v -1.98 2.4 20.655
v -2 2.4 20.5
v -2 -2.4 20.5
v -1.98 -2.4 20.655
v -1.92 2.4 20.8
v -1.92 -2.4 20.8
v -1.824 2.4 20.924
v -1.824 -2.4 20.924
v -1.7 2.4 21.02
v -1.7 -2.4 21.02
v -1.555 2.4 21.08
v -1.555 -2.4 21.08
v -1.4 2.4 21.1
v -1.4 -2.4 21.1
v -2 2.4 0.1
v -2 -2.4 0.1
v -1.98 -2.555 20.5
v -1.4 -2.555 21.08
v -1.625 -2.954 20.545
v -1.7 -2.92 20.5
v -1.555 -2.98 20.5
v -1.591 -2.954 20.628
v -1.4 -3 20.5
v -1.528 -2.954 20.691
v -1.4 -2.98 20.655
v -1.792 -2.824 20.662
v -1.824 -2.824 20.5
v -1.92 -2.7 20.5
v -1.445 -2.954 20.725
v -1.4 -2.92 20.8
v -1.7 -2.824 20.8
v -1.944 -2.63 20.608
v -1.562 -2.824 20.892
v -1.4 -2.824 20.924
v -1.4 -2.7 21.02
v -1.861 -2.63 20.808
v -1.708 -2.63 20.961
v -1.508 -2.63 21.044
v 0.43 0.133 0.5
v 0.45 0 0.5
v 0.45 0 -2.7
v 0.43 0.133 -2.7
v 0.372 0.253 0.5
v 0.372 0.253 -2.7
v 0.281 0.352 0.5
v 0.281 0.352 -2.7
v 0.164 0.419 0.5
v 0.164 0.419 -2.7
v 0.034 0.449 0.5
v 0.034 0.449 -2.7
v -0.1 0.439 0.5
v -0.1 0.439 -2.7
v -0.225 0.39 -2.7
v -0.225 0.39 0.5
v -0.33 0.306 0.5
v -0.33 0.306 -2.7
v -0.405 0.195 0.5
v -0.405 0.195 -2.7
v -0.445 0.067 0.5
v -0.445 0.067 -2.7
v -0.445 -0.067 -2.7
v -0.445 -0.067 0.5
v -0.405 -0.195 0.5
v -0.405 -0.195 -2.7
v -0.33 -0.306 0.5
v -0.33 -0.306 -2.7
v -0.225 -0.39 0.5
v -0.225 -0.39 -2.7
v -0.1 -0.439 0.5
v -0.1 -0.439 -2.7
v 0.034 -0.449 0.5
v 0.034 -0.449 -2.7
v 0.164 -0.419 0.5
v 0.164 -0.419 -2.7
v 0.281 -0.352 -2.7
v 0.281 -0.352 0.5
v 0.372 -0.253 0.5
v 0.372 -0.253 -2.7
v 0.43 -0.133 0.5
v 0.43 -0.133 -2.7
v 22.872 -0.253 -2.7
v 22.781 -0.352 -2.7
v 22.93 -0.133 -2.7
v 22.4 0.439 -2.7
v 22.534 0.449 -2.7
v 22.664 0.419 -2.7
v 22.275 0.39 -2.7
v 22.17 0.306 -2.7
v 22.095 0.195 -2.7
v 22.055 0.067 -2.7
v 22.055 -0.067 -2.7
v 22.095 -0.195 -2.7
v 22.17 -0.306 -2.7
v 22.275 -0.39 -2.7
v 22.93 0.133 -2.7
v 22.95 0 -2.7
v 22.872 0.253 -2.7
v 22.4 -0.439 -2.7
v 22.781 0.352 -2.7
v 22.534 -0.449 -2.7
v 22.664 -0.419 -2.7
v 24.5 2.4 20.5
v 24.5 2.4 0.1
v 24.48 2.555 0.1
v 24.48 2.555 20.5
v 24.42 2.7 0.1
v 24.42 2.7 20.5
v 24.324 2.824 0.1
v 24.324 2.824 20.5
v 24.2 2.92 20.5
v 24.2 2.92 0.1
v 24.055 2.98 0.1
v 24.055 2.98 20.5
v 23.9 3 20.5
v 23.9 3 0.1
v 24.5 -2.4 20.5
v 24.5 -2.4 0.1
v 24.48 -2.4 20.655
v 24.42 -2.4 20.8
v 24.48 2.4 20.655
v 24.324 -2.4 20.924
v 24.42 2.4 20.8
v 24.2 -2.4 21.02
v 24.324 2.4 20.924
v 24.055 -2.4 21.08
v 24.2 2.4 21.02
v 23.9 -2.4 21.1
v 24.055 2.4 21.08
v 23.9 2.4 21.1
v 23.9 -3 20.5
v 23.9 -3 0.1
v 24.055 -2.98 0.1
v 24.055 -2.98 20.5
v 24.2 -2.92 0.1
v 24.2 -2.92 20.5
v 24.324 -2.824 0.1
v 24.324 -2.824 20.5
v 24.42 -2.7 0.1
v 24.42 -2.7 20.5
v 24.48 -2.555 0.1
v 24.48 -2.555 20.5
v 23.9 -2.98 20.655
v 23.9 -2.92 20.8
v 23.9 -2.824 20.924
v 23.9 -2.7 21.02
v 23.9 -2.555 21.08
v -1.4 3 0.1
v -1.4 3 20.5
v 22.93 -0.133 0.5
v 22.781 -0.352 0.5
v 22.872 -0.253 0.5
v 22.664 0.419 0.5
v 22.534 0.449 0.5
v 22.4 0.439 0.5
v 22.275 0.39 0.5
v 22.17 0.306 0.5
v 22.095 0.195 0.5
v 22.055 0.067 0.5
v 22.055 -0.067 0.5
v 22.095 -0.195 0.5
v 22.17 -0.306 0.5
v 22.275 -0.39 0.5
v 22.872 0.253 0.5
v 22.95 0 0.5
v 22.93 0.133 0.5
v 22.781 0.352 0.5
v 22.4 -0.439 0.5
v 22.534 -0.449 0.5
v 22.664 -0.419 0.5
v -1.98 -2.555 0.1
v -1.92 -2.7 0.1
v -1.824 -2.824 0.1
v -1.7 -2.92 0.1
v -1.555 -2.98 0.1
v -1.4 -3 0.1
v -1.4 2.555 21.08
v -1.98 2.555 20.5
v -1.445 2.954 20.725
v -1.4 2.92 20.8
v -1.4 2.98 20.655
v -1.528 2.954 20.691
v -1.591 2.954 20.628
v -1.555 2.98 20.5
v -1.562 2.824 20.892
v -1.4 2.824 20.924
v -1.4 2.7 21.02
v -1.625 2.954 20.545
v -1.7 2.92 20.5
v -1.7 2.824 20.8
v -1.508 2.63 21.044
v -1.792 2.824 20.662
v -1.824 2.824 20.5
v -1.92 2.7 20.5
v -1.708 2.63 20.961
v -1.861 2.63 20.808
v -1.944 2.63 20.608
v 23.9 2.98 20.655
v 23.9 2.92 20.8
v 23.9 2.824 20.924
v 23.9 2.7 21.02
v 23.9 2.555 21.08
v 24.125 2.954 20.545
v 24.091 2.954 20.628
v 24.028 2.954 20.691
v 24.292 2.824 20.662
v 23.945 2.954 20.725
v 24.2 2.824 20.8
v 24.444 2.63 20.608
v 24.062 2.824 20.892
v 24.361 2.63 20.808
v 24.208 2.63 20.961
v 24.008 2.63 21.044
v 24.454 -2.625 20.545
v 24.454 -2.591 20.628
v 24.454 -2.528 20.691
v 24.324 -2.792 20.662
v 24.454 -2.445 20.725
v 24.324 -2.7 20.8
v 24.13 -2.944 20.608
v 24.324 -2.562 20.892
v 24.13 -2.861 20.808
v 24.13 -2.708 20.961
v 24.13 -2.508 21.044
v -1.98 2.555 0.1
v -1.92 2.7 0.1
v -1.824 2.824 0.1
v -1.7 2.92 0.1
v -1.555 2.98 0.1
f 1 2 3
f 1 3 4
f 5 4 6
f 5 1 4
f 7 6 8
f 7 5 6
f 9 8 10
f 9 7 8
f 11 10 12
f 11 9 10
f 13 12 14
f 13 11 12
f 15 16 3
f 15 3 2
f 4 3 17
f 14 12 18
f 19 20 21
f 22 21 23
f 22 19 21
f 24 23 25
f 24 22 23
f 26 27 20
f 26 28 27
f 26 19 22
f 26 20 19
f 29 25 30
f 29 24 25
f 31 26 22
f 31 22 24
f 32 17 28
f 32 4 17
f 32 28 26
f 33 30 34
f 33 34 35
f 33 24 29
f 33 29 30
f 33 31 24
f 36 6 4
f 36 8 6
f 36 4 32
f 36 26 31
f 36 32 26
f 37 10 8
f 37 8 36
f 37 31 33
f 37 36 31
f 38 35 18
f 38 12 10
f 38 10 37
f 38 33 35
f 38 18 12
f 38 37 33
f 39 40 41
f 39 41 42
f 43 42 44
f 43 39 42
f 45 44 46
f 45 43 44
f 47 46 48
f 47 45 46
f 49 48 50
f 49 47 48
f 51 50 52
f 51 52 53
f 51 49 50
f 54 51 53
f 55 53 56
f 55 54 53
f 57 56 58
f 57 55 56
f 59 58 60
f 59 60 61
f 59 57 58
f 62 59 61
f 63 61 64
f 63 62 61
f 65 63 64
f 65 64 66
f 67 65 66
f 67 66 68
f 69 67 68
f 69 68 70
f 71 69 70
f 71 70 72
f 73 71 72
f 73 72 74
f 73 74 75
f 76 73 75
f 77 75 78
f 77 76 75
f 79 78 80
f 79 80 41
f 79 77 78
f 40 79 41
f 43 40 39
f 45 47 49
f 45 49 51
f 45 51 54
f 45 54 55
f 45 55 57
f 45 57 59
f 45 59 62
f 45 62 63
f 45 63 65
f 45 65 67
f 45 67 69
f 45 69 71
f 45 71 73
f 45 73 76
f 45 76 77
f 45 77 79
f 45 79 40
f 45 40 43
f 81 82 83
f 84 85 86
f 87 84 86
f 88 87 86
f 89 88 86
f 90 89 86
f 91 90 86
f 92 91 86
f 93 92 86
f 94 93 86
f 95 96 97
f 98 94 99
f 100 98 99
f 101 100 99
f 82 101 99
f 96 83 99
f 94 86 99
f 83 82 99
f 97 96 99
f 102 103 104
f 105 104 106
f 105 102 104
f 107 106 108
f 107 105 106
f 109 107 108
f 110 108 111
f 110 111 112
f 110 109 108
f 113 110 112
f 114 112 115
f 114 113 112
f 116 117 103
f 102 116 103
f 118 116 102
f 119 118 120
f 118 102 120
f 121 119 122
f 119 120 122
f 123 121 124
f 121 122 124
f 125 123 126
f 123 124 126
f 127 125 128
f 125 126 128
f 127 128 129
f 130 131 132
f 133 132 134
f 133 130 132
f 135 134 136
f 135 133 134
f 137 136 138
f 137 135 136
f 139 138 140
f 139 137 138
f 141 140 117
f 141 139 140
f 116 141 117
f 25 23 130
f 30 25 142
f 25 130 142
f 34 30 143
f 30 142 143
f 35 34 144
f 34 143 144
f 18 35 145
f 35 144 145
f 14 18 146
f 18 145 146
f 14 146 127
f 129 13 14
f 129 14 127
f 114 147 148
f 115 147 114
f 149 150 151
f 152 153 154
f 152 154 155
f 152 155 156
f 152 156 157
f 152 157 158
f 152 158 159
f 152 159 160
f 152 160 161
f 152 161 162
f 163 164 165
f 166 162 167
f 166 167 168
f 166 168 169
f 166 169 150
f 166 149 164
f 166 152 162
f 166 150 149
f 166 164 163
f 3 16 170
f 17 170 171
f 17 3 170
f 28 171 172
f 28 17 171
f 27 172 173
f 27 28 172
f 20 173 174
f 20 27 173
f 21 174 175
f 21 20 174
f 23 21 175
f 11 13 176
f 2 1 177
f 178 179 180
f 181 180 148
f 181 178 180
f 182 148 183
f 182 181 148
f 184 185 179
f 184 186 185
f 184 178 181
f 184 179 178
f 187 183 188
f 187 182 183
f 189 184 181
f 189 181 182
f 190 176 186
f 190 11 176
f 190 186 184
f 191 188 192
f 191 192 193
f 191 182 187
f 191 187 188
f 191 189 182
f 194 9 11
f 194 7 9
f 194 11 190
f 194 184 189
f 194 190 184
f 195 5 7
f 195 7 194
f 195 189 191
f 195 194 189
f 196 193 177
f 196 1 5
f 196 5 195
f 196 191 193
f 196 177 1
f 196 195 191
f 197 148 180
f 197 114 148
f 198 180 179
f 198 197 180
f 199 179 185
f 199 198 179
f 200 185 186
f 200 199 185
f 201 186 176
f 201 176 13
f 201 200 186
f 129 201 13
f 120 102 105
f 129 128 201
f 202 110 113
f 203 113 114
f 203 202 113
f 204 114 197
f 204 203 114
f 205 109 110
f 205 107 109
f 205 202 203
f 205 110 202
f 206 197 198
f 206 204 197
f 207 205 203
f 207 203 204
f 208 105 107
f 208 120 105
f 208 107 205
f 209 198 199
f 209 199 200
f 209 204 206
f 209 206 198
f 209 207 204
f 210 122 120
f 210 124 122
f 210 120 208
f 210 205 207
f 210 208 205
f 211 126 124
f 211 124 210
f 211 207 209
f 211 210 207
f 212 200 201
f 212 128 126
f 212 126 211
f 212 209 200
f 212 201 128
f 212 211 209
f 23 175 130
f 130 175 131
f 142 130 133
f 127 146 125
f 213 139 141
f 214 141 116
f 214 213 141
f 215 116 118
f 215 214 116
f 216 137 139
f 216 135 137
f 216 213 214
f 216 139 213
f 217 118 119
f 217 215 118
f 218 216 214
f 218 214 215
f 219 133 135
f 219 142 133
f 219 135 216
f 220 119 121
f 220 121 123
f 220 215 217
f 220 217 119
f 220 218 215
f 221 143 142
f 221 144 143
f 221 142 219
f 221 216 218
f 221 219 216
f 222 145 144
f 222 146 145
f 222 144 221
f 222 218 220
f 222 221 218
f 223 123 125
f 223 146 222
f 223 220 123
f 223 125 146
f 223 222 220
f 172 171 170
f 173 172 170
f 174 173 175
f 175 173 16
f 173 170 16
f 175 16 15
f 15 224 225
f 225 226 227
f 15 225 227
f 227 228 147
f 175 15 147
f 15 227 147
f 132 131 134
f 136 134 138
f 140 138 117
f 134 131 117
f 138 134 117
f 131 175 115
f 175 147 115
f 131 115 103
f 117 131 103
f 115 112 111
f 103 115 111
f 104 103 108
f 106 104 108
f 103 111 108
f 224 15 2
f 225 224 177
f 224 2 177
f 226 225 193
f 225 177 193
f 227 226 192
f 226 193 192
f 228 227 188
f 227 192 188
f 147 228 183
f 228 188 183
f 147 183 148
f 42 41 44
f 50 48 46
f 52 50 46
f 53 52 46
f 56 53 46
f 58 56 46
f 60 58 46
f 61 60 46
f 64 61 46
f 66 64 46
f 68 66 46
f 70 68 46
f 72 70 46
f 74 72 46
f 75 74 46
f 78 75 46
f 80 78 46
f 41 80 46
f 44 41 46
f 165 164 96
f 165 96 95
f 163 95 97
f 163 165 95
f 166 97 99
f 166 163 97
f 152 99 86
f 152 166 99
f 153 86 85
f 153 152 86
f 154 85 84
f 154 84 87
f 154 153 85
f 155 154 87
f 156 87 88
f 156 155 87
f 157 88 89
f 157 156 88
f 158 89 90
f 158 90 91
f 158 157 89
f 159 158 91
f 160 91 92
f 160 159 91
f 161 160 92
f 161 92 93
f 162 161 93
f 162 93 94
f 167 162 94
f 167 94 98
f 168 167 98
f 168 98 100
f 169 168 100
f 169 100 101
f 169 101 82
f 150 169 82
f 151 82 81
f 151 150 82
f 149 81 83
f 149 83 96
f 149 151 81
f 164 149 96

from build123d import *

# Parameters (mm, degrees)
SKETCH_W     = 26.5
SKETCH_H     = 6
PAD_DEPTH    = 21
FILLET_R     = 0.6
SKETCH001_R  = 0.45
PAD001_DEPTH = 3.2


with BuildPart() as fillet_body:
    # Sketch → Pad (new body)
    with BuildSketch(Plane.XY.offset(0.1)):
        with Locations((11.25, 0)):
            Rectangle(SKETCH_W, SKETCH_H)
    extrude(amount=PAD_DEPTH)

    # Fillet
    fillet_edges = [fillet_body.edges().sort_by_distance(p)[0] for p in [
        (-2, 0, 21.1),
        (-2, -3, 10.6),
        (11.25, -3, 21.1),
        (24.5, -3, 10.6),
        (24.5, 0, 21.1),
        (24.5, 3, 10.6),
        (11.25, 3, 21.1),
        (-2, 3, 10.6),
    ]]
    fillet(fillet_edges, radius=FILLET_R)


with BuildPart() as pad001:
    # Sketch001 → Pad001 (new body)
    with BuildSketch(Plane.XY.offset(0.5)):
        Circle(SKETCH001_R)
        with Locations((22.5, 0)):
            Circle(SKETCH001_R)
    extrude(amount=-PAD001_DEPTH)


solid = Compound([fillet_body.part, pad001.part])
